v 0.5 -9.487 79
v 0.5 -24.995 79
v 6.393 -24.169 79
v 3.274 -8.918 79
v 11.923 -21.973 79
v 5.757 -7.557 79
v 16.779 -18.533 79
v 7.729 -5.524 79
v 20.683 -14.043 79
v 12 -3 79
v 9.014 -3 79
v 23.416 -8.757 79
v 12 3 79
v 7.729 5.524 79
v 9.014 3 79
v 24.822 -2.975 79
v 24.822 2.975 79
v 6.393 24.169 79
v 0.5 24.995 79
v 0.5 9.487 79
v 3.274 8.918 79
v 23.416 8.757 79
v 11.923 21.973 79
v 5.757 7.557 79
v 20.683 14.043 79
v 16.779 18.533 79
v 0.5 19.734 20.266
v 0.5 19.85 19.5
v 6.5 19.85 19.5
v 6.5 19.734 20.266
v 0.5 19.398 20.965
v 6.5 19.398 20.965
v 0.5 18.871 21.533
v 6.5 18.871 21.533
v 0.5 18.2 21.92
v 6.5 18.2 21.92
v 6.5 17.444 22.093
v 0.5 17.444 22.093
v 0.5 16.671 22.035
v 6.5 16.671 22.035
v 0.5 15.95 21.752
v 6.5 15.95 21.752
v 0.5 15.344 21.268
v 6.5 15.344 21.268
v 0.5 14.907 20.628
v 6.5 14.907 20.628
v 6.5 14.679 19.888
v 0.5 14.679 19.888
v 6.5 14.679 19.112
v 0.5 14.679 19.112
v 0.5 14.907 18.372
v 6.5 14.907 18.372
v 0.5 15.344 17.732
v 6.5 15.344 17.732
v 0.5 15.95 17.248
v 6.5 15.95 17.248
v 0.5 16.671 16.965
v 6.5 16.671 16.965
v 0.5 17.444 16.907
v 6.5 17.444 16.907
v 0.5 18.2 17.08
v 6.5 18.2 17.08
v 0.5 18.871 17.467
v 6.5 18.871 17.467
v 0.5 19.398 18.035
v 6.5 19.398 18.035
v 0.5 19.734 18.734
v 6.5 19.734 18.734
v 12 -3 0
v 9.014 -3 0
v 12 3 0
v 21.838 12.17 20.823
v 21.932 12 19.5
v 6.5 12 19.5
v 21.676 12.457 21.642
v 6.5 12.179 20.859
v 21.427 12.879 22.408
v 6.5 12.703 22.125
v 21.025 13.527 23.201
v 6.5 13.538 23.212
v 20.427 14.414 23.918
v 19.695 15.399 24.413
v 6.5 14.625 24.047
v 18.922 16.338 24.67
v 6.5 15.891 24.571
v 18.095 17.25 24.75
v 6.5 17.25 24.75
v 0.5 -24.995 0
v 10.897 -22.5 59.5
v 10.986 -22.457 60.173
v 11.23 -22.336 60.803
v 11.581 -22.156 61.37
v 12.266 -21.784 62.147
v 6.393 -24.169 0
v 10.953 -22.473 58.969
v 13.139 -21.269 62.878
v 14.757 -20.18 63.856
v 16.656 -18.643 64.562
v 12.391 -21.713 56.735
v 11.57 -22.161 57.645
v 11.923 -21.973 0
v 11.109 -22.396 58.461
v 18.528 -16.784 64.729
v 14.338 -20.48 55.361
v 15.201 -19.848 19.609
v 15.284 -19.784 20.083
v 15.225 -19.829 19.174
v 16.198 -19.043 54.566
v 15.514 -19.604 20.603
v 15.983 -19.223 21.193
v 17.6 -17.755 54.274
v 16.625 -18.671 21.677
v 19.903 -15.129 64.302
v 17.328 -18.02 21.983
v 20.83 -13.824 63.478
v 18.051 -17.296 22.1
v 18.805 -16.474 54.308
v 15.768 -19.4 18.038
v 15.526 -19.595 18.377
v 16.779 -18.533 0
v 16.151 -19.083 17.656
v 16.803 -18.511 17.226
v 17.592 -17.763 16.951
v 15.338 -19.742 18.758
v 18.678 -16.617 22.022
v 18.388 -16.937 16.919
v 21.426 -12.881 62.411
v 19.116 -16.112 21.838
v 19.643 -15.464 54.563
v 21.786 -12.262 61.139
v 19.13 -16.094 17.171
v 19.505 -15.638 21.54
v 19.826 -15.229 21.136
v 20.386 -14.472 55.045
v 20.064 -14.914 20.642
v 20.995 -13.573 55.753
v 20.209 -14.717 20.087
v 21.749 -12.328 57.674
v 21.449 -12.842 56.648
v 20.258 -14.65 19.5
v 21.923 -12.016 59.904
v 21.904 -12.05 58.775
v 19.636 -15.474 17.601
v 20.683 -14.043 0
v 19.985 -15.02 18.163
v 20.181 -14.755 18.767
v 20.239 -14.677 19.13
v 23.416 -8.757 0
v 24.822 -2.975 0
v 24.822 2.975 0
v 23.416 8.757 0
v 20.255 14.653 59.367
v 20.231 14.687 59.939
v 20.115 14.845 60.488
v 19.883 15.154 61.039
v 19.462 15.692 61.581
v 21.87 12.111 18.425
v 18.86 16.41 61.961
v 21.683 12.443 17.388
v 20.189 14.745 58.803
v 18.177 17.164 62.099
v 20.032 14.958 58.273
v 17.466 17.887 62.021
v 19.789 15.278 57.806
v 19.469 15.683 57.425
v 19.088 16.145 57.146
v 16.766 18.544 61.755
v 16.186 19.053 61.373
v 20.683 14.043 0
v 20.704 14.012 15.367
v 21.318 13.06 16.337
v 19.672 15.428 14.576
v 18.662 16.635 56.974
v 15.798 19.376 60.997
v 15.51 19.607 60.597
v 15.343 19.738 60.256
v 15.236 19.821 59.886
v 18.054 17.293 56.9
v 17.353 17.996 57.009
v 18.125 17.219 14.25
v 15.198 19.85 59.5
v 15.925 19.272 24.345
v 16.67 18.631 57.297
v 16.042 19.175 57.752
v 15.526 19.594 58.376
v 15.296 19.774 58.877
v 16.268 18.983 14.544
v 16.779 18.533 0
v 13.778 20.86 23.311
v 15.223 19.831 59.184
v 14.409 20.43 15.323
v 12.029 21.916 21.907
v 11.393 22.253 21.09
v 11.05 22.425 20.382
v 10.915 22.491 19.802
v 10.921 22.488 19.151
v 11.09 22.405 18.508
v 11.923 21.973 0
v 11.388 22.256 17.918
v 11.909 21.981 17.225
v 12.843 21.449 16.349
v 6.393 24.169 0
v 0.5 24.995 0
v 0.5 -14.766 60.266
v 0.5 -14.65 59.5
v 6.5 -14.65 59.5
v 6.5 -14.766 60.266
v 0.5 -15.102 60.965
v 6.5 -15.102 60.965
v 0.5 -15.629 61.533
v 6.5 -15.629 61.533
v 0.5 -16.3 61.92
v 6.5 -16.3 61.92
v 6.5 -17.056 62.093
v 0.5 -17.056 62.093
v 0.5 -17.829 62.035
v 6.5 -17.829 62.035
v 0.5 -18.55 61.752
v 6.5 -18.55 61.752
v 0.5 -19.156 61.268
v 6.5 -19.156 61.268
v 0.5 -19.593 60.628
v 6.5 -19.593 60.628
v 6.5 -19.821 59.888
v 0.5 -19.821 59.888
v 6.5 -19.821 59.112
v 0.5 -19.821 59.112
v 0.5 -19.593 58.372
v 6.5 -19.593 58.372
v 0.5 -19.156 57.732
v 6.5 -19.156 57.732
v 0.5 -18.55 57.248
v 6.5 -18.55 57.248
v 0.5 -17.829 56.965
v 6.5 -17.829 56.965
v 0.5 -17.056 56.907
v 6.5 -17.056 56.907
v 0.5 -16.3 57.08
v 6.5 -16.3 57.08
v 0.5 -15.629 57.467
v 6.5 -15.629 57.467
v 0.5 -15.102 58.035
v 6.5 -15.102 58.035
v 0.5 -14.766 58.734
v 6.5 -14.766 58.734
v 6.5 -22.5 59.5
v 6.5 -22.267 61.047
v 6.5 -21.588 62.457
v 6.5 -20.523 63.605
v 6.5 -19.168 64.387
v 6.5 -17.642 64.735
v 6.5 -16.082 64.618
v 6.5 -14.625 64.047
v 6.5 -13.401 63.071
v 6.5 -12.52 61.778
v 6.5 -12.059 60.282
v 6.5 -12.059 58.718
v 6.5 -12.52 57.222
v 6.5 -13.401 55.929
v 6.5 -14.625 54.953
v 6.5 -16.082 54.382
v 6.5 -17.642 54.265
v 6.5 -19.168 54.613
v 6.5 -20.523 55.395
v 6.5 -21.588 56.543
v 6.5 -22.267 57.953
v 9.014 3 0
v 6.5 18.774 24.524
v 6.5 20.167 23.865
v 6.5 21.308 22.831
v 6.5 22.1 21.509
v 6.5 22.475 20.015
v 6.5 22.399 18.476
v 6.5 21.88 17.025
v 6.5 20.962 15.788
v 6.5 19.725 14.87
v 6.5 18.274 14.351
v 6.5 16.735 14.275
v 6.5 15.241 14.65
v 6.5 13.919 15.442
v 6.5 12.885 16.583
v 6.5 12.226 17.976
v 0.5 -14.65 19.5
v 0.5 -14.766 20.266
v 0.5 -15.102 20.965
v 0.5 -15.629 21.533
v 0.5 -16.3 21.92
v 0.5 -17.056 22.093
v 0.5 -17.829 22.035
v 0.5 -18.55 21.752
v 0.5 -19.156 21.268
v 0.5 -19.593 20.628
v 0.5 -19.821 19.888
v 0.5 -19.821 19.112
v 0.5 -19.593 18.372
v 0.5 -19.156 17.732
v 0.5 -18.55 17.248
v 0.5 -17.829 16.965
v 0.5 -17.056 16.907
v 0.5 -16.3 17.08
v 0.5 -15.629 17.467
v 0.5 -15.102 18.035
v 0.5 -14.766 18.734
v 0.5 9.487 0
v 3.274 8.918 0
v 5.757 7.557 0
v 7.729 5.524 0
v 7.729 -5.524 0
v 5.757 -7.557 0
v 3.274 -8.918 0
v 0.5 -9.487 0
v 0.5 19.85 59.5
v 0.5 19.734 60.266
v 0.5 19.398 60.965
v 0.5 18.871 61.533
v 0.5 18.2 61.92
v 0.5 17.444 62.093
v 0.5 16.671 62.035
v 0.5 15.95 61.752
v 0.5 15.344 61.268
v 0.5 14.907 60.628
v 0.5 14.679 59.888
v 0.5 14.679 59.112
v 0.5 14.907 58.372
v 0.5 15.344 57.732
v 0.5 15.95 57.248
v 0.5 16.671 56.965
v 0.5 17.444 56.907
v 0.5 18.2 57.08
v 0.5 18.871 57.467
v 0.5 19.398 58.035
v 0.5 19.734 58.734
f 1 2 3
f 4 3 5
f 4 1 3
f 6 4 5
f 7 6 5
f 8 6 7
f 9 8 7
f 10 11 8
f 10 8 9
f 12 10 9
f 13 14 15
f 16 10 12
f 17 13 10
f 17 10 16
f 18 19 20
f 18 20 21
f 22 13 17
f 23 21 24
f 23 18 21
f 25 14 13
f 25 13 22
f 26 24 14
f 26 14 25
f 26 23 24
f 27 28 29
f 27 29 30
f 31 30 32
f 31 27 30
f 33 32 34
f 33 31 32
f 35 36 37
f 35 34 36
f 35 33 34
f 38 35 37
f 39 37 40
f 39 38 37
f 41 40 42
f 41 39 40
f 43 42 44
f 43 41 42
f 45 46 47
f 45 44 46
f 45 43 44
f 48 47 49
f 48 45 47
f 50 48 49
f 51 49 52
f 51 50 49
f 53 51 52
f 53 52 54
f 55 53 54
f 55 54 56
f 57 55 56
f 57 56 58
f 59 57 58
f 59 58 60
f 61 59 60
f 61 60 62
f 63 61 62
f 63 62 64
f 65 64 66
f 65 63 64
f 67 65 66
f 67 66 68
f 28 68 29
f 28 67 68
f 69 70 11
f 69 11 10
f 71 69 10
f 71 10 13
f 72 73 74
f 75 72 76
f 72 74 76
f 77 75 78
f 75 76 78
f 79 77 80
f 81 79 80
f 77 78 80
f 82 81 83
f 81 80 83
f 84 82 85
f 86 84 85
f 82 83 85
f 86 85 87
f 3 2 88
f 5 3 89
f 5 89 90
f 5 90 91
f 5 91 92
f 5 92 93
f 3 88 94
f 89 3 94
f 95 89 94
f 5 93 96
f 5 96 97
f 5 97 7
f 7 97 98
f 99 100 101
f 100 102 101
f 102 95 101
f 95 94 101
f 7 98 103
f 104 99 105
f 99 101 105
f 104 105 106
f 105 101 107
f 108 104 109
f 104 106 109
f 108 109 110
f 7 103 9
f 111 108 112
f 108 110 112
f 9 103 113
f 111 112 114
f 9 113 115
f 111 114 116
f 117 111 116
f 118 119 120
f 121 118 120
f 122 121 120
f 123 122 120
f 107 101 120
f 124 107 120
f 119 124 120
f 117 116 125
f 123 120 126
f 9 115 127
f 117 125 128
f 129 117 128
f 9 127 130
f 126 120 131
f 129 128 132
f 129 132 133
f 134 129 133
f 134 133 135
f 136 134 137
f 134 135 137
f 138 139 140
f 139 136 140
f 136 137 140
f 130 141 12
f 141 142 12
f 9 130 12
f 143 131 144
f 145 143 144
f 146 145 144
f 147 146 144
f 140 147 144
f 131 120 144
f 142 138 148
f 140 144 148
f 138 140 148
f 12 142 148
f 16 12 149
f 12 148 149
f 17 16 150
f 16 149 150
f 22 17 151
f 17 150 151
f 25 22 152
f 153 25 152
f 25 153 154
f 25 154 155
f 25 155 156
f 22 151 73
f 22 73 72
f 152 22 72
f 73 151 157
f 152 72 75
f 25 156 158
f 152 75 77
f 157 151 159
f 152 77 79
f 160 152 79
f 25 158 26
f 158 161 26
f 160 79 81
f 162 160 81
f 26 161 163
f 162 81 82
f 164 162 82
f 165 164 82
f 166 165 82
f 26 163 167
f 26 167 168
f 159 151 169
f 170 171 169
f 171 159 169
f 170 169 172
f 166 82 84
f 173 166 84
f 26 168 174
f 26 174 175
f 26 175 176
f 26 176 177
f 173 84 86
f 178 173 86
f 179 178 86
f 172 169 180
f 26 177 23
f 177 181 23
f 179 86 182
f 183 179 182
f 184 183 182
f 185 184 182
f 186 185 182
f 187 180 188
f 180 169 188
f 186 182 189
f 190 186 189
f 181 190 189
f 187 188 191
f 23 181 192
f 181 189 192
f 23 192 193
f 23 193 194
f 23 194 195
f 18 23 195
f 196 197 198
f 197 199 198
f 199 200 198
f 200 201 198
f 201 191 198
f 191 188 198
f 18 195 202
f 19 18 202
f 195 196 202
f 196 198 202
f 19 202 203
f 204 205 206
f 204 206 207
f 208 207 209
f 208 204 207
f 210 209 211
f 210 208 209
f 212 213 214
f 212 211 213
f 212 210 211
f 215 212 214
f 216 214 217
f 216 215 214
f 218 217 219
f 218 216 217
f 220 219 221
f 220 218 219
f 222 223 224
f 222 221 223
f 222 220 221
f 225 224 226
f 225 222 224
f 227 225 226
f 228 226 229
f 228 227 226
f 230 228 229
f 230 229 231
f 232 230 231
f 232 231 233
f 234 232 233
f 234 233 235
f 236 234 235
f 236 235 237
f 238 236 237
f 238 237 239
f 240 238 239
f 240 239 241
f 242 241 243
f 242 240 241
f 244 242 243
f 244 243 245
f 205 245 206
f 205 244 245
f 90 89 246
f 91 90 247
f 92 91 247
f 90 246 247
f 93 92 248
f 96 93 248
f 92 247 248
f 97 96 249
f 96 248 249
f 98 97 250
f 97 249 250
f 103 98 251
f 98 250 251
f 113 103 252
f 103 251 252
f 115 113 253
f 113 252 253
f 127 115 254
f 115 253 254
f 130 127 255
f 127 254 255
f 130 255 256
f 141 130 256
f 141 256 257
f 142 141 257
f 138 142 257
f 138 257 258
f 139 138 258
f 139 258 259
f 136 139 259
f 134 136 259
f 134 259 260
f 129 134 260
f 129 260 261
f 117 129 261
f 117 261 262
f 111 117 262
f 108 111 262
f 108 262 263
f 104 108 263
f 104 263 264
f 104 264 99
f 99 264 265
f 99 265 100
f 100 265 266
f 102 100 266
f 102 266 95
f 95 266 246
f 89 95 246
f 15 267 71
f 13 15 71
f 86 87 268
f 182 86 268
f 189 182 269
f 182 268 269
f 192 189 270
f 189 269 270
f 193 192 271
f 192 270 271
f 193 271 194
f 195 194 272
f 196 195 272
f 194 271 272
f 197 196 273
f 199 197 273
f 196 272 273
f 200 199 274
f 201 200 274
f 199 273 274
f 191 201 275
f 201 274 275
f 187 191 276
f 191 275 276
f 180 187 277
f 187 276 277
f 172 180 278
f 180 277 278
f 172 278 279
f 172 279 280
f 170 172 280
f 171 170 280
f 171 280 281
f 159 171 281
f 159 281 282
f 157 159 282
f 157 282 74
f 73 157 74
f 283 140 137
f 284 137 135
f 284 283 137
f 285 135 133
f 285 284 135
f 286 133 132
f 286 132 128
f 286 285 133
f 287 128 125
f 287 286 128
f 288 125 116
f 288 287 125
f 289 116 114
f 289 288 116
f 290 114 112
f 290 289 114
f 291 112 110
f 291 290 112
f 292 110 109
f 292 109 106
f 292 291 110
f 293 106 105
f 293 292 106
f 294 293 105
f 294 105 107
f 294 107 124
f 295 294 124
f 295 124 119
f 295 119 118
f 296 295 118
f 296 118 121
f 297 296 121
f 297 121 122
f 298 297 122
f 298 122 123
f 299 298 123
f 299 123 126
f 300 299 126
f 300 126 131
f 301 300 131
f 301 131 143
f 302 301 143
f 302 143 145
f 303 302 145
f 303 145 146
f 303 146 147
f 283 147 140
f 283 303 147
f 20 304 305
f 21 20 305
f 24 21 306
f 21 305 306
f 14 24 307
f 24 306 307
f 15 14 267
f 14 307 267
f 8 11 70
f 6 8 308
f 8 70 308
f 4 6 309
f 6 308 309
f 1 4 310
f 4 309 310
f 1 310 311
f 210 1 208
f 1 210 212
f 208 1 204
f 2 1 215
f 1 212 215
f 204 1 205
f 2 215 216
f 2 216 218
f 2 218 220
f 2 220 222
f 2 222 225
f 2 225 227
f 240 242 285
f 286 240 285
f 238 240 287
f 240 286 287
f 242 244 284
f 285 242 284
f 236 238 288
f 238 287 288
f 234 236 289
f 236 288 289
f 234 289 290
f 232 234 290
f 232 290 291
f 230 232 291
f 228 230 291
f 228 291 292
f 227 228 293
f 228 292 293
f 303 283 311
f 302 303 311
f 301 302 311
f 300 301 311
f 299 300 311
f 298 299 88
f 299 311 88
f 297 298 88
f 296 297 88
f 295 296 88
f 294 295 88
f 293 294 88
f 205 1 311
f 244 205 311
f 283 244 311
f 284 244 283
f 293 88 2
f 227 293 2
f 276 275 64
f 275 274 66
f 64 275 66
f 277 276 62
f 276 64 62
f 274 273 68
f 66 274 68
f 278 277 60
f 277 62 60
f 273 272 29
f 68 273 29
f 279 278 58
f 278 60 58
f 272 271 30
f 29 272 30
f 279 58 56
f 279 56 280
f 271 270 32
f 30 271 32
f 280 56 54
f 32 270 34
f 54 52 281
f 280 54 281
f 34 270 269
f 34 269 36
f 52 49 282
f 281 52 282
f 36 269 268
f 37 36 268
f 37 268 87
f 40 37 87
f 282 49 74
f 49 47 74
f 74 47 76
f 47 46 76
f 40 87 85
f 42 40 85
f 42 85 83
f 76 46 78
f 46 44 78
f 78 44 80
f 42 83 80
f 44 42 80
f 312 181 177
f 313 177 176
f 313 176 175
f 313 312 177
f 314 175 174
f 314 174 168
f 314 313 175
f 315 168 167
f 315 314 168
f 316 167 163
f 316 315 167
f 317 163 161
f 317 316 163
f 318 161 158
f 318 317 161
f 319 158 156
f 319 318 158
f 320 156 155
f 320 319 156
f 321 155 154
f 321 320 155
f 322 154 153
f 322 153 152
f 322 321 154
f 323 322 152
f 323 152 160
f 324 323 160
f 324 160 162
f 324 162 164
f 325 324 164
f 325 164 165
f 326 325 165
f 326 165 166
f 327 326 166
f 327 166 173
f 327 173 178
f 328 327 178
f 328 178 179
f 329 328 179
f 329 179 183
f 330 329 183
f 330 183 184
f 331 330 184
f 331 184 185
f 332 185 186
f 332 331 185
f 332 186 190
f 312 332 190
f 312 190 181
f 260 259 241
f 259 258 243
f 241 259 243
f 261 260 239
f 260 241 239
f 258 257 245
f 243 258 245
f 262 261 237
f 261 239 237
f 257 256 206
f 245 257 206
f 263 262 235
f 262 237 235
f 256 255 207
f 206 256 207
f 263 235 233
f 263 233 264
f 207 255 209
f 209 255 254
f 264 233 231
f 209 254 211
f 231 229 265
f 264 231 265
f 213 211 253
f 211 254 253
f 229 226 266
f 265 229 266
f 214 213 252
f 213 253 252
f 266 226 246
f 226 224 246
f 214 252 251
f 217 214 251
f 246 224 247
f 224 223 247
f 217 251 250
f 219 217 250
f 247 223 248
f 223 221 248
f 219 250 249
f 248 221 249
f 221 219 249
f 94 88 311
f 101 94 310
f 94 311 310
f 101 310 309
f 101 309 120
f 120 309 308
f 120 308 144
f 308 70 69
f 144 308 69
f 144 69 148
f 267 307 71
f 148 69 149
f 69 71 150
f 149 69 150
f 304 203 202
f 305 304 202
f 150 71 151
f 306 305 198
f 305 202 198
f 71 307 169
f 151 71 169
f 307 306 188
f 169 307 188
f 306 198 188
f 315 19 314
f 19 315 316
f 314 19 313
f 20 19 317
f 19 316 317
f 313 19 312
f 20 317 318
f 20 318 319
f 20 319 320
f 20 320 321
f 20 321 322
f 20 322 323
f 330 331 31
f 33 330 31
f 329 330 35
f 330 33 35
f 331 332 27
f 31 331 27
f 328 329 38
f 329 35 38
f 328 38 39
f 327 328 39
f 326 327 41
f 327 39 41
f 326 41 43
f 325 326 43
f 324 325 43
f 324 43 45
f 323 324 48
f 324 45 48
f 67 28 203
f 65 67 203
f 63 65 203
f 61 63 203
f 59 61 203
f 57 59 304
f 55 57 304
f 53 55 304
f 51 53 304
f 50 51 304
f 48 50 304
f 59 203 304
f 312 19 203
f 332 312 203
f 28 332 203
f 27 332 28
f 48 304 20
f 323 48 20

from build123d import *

# Parameters (mm, degrees)
F1_DEPTH = 79
F2_R     = 2.6
F3_DEPTH = 25.001
F6_DEPTH = 25
F7_W     = 6
F7_H     = 6
F8_DEPTH = 79.0010001


with BuildPart() as f1:
    # F0 (on Top) → F1 (new body)
    with BuildSketch(Plane.XY):
        with BuildLine():
            Line((0.5, -9.4868329805), (0.5, -24.9949994999))
            ThreePointArc((0.5, -24.9949994999), (25, 0), (0.5, 24.9949994999))
            Line((0.5, 24.9949994999), (0.5, 9.4868329805))
            ThreePointArc((0.5, 9.4868329805), (9.5, 0), (0.5, -9.4868329805))
        make_face()
    extrude(amount=F1_DEPTH)

    # F2 (on Right) → F3 (cut, through all)
    with BuildSketch(Plane.YZ):
        with Locations((-17.25, 19.5)):
            Circle(F2_R)
        with Locations((-17.25, 59.5)):
            Circle(F2_R)
        with Locations((17.25, 59.5)):
            Circle(F2_R)
        with Locations((17.25, 19.5)):
            Circle(F2_R)
    extrude(amount=F3_DEPTH, mode=Mode.SUBTRACT)

    # F5 (on offset) → F6 (cut)
    with BuildSketch(Plane(origin=(6.5, 0, 0), x_dir=(0, -1, 0), z_dir=(-1, 0, 0))):
        with BuildLine():
            ThreePointArc((12, 59.5), (17.25, 54.25), (22.5, 59.5))
            ThreePointArc((22.5, 59.5), (17.25, 64.75), (12, 59.5))
        make_face()
        with BuildLine():
            ThreePointArc((-12, 19.5), (-13.5376893988, 23.2123106012), (-17.25, 24.75))
            ThreePointArc((-17.25, 24.75), (-20.9623106012, 15.7876893988), (-12, 19.5))
        make_face()
    extrude(amount=-F6_DEPTH, mode=Mode.SUBTRACT)

    # F7 (on Top) → F8 (cut, through all)
    with BuildSketch(Plane.XY):
        with Locations((9, 0)):
            Rectangle(F7_W, F7_H)
    extrude(amount=F8_DEPTH, mode=Mode.SUBTRACT)


solid = f1.part
